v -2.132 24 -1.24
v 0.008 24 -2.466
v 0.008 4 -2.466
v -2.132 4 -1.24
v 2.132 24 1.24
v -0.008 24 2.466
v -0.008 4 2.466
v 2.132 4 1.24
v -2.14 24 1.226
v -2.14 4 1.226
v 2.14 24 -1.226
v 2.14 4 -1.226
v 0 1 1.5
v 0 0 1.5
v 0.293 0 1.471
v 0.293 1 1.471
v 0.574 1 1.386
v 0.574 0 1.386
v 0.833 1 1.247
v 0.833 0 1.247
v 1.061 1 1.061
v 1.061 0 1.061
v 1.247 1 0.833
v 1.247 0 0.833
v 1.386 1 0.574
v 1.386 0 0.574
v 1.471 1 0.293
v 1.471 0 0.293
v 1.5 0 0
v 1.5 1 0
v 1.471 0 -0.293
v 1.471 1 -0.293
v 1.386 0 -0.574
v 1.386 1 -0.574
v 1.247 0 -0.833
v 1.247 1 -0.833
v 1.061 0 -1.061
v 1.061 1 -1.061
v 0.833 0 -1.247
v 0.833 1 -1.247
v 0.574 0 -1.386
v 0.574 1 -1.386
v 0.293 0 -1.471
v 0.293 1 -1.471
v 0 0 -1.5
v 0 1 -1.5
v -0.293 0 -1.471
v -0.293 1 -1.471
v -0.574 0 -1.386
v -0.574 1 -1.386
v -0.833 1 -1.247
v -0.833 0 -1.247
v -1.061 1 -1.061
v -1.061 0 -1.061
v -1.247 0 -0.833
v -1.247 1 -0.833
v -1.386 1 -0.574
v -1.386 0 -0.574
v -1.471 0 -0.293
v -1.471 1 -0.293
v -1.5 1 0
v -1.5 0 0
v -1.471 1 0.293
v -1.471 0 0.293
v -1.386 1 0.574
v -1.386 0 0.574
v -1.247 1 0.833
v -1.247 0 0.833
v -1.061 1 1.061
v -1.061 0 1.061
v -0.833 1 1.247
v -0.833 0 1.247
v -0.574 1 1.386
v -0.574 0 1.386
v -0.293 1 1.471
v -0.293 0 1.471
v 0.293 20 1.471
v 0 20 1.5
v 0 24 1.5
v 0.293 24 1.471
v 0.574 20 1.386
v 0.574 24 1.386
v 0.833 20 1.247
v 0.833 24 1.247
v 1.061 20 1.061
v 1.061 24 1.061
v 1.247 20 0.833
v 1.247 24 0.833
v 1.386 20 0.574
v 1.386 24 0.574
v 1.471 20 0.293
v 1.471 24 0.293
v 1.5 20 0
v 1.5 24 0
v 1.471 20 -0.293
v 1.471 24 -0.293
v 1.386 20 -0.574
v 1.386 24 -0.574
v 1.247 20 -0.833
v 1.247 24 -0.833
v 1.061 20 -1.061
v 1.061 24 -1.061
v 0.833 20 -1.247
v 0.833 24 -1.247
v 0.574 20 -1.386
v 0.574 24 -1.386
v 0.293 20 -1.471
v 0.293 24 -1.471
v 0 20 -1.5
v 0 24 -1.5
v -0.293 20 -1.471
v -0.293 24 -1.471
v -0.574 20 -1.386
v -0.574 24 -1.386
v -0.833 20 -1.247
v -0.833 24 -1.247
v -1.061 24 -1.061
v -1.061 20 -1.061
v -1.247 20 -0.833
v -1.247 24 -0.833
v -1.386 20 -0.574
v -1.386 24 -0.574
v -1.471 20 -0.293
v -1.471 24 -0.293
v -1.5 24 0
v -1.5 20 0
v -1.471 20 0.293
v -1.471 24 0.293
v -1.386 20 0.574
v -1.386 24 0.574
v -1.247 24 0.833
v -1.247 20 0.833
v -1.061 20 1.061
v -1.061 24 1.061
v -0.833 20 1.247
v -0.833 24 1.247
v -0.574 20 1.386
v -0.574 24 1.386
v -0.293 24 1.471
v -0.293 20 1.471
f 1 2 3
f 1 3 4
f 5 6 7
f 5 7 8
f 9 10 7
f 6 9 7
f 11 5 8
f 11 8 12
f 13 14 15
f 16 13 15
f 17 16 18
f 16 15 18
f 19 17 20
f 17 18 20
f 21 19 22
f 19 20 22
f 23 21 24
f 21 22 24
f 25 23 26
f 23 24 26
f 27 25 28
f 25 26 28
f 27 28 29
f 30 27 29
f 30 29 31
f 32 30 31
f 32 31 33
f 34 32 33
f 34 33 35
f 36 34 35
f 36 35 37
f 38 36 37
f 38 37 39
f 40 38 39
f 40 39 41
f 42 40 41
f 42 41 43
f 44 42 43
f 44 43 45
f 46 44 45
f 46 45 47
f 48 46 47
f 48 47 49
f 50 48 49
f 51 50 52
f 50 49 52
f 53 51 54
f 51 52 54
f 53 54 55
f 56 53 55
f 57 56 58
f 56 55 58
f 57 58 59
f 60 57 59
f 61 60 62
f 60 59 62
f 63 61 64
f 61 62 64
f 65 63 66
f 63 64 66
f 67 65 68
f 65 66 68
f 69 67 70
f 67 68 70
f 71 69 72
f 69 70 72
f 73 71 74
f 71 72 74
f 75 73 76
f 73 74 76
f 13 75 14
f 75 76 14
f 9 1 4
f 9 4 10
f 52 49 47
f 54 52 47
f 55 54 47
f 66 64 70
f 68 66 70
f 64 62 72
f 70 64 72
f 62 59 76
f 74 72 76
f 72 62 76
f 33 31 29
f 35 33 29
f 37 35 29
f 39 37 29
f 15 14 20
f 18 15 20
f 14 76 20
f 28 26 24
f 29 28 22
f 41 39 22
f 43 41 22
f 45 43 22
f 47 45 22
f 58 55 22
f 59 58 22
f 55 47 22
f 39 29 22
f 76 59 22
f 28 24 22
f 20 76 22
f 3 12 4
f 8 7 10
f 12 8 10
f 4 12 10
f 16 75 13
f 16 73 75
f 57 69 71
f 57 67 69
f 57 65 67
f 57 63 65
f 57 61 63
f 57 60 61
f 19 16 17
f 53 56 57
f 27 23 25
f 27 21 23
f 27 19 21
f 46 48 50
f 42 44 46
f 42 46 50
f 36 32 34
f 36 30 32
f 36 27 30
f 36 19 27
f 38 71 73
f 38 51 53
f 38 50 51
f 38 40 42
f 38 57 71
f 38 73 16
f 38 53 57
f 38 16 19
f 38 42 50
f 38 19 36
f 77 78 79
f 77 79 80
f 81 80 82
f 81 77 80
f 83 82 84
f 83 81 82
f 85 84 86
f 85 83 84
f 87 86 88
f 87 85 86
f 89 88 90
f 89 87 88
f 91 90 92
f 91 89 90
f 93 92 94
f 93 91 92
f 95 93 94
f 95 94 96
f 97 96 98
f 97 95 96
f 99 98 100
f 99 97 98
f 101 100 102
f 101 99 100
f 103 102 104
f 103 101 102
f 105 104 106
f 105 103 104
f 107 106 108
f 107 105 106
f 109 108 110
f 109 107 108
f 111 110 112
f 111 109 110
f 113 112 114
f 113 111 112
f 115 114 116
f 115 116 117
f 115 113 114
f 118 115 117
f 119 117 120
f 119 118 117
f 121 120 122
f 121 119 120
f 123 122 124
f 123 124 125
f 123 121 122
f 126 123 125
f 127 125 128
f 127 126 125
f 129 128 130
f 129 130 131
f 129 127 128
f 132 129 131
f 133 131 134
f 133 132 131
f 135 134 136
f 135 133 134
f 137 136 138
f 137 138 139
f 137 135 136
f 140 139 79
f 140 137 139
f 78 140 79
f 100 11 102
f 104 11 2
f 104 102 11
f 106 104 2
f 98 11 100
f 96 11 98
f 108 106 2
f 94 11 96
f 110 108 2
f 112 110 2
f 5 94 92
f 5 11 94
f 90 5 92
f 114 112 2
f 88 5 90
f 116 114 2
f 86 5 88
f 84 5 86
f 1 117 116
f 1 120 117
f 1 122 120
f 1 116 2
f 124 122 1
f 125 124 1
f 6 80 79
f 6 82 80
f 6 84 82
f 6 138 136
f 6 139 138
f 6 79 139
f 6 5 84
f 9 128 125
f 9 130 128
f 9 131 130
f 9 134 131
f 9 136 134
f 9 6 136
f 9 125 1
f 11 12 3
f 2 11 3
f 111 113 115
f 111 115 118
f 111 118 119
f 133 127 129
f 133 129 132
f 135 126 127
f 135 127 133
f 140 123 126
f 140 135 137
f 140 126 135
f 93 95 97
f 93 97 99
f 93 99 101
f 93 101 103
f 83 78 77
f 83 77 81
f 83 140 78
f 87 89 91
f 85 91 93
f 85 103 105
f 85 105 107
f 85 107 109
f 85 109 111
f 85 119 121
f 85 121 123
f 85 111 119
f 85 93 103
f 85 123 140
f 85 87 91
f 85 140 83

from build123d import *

# Parameters (mm, degrees)
ESQUISSE1_R             = 1.5
BOSS_EXTRU_1_DEPTH      = 4
BOSS_EXTRU_2_DEPTH      = 20
ENL_V_START             = -4
ESQUISSE3_R             = 1.5
ENL_V_MAT_EXTRU_1_DEPTH = 4
PER_AGE1_START          = 1
PER_AGE1_OUTLINE_R      = 1.5
PER_AGE1_DEPTH          = 3


# Read off the part's stored shape, not the designer's step: Perçage1
with BuildPart() as part:
    # Esquisse1 → Boss.-Extru.1 (new body)
    with BuildSketch(Plane(origin=(0, 0, 0), x_dir=(1, 0, 0), z_dir=(0, 1, 0))):
        with Locations(Location((0, 0, 0), (0, 0, 270))):
            Circle(ESQUISSE1_R)
    extrude(amount=BOSS_EXTRU_1_DEPTH)

    # Esquisse2 → Boss.-Extru.2 (add)
    with BuildSketch(Plane(origin=(0, 4, 0), x_dir=(-1, 0, 0), z_dir=(0, 1, 0))):
        Polygon((2.131865991, -1.240236504), (2.140009315, 1.226131853), (0.008143324, 2.466368358), (-2.131865991, 1.240236504), (-2.140009315, -1.226131853), (-0.008143324, -2.466368358), align=None)
    extrude(amount=BOSS_EXTRU_2_DEPTH)

    # Esquisse3 → Enlèv. mat.-Extru.1 (cut)
    with BuildSketch(Plane(origin=(0, 24, 0), x_dir=(-1, 0, 0), z_dir=(0, 1, 0)).offset(ENL_V_START)):
        with Locations(Location((0, 0, 0), (0, 0, 90))):
            Circle(ESQUISSE3_R)
    extrude(amount=ENL_V_MAT_EXTRU_1_DEPTH, mode=Mode.SUBTRACT)

    # Perçage1 outline → Perçage1 (cut)
    with BuildSketch(Plane(origin=(0, 0, 0), x_dir=(1, 0, 0), z_dir=(0, 1, 0)).offset(PER_AGE1_START)):
        Circle(PER_AGE1_OUTLINE_R)
    extrude(amount=PER_AGE1_DEPTH, mode=Mode.SUBTRACT)


solid = part.part
